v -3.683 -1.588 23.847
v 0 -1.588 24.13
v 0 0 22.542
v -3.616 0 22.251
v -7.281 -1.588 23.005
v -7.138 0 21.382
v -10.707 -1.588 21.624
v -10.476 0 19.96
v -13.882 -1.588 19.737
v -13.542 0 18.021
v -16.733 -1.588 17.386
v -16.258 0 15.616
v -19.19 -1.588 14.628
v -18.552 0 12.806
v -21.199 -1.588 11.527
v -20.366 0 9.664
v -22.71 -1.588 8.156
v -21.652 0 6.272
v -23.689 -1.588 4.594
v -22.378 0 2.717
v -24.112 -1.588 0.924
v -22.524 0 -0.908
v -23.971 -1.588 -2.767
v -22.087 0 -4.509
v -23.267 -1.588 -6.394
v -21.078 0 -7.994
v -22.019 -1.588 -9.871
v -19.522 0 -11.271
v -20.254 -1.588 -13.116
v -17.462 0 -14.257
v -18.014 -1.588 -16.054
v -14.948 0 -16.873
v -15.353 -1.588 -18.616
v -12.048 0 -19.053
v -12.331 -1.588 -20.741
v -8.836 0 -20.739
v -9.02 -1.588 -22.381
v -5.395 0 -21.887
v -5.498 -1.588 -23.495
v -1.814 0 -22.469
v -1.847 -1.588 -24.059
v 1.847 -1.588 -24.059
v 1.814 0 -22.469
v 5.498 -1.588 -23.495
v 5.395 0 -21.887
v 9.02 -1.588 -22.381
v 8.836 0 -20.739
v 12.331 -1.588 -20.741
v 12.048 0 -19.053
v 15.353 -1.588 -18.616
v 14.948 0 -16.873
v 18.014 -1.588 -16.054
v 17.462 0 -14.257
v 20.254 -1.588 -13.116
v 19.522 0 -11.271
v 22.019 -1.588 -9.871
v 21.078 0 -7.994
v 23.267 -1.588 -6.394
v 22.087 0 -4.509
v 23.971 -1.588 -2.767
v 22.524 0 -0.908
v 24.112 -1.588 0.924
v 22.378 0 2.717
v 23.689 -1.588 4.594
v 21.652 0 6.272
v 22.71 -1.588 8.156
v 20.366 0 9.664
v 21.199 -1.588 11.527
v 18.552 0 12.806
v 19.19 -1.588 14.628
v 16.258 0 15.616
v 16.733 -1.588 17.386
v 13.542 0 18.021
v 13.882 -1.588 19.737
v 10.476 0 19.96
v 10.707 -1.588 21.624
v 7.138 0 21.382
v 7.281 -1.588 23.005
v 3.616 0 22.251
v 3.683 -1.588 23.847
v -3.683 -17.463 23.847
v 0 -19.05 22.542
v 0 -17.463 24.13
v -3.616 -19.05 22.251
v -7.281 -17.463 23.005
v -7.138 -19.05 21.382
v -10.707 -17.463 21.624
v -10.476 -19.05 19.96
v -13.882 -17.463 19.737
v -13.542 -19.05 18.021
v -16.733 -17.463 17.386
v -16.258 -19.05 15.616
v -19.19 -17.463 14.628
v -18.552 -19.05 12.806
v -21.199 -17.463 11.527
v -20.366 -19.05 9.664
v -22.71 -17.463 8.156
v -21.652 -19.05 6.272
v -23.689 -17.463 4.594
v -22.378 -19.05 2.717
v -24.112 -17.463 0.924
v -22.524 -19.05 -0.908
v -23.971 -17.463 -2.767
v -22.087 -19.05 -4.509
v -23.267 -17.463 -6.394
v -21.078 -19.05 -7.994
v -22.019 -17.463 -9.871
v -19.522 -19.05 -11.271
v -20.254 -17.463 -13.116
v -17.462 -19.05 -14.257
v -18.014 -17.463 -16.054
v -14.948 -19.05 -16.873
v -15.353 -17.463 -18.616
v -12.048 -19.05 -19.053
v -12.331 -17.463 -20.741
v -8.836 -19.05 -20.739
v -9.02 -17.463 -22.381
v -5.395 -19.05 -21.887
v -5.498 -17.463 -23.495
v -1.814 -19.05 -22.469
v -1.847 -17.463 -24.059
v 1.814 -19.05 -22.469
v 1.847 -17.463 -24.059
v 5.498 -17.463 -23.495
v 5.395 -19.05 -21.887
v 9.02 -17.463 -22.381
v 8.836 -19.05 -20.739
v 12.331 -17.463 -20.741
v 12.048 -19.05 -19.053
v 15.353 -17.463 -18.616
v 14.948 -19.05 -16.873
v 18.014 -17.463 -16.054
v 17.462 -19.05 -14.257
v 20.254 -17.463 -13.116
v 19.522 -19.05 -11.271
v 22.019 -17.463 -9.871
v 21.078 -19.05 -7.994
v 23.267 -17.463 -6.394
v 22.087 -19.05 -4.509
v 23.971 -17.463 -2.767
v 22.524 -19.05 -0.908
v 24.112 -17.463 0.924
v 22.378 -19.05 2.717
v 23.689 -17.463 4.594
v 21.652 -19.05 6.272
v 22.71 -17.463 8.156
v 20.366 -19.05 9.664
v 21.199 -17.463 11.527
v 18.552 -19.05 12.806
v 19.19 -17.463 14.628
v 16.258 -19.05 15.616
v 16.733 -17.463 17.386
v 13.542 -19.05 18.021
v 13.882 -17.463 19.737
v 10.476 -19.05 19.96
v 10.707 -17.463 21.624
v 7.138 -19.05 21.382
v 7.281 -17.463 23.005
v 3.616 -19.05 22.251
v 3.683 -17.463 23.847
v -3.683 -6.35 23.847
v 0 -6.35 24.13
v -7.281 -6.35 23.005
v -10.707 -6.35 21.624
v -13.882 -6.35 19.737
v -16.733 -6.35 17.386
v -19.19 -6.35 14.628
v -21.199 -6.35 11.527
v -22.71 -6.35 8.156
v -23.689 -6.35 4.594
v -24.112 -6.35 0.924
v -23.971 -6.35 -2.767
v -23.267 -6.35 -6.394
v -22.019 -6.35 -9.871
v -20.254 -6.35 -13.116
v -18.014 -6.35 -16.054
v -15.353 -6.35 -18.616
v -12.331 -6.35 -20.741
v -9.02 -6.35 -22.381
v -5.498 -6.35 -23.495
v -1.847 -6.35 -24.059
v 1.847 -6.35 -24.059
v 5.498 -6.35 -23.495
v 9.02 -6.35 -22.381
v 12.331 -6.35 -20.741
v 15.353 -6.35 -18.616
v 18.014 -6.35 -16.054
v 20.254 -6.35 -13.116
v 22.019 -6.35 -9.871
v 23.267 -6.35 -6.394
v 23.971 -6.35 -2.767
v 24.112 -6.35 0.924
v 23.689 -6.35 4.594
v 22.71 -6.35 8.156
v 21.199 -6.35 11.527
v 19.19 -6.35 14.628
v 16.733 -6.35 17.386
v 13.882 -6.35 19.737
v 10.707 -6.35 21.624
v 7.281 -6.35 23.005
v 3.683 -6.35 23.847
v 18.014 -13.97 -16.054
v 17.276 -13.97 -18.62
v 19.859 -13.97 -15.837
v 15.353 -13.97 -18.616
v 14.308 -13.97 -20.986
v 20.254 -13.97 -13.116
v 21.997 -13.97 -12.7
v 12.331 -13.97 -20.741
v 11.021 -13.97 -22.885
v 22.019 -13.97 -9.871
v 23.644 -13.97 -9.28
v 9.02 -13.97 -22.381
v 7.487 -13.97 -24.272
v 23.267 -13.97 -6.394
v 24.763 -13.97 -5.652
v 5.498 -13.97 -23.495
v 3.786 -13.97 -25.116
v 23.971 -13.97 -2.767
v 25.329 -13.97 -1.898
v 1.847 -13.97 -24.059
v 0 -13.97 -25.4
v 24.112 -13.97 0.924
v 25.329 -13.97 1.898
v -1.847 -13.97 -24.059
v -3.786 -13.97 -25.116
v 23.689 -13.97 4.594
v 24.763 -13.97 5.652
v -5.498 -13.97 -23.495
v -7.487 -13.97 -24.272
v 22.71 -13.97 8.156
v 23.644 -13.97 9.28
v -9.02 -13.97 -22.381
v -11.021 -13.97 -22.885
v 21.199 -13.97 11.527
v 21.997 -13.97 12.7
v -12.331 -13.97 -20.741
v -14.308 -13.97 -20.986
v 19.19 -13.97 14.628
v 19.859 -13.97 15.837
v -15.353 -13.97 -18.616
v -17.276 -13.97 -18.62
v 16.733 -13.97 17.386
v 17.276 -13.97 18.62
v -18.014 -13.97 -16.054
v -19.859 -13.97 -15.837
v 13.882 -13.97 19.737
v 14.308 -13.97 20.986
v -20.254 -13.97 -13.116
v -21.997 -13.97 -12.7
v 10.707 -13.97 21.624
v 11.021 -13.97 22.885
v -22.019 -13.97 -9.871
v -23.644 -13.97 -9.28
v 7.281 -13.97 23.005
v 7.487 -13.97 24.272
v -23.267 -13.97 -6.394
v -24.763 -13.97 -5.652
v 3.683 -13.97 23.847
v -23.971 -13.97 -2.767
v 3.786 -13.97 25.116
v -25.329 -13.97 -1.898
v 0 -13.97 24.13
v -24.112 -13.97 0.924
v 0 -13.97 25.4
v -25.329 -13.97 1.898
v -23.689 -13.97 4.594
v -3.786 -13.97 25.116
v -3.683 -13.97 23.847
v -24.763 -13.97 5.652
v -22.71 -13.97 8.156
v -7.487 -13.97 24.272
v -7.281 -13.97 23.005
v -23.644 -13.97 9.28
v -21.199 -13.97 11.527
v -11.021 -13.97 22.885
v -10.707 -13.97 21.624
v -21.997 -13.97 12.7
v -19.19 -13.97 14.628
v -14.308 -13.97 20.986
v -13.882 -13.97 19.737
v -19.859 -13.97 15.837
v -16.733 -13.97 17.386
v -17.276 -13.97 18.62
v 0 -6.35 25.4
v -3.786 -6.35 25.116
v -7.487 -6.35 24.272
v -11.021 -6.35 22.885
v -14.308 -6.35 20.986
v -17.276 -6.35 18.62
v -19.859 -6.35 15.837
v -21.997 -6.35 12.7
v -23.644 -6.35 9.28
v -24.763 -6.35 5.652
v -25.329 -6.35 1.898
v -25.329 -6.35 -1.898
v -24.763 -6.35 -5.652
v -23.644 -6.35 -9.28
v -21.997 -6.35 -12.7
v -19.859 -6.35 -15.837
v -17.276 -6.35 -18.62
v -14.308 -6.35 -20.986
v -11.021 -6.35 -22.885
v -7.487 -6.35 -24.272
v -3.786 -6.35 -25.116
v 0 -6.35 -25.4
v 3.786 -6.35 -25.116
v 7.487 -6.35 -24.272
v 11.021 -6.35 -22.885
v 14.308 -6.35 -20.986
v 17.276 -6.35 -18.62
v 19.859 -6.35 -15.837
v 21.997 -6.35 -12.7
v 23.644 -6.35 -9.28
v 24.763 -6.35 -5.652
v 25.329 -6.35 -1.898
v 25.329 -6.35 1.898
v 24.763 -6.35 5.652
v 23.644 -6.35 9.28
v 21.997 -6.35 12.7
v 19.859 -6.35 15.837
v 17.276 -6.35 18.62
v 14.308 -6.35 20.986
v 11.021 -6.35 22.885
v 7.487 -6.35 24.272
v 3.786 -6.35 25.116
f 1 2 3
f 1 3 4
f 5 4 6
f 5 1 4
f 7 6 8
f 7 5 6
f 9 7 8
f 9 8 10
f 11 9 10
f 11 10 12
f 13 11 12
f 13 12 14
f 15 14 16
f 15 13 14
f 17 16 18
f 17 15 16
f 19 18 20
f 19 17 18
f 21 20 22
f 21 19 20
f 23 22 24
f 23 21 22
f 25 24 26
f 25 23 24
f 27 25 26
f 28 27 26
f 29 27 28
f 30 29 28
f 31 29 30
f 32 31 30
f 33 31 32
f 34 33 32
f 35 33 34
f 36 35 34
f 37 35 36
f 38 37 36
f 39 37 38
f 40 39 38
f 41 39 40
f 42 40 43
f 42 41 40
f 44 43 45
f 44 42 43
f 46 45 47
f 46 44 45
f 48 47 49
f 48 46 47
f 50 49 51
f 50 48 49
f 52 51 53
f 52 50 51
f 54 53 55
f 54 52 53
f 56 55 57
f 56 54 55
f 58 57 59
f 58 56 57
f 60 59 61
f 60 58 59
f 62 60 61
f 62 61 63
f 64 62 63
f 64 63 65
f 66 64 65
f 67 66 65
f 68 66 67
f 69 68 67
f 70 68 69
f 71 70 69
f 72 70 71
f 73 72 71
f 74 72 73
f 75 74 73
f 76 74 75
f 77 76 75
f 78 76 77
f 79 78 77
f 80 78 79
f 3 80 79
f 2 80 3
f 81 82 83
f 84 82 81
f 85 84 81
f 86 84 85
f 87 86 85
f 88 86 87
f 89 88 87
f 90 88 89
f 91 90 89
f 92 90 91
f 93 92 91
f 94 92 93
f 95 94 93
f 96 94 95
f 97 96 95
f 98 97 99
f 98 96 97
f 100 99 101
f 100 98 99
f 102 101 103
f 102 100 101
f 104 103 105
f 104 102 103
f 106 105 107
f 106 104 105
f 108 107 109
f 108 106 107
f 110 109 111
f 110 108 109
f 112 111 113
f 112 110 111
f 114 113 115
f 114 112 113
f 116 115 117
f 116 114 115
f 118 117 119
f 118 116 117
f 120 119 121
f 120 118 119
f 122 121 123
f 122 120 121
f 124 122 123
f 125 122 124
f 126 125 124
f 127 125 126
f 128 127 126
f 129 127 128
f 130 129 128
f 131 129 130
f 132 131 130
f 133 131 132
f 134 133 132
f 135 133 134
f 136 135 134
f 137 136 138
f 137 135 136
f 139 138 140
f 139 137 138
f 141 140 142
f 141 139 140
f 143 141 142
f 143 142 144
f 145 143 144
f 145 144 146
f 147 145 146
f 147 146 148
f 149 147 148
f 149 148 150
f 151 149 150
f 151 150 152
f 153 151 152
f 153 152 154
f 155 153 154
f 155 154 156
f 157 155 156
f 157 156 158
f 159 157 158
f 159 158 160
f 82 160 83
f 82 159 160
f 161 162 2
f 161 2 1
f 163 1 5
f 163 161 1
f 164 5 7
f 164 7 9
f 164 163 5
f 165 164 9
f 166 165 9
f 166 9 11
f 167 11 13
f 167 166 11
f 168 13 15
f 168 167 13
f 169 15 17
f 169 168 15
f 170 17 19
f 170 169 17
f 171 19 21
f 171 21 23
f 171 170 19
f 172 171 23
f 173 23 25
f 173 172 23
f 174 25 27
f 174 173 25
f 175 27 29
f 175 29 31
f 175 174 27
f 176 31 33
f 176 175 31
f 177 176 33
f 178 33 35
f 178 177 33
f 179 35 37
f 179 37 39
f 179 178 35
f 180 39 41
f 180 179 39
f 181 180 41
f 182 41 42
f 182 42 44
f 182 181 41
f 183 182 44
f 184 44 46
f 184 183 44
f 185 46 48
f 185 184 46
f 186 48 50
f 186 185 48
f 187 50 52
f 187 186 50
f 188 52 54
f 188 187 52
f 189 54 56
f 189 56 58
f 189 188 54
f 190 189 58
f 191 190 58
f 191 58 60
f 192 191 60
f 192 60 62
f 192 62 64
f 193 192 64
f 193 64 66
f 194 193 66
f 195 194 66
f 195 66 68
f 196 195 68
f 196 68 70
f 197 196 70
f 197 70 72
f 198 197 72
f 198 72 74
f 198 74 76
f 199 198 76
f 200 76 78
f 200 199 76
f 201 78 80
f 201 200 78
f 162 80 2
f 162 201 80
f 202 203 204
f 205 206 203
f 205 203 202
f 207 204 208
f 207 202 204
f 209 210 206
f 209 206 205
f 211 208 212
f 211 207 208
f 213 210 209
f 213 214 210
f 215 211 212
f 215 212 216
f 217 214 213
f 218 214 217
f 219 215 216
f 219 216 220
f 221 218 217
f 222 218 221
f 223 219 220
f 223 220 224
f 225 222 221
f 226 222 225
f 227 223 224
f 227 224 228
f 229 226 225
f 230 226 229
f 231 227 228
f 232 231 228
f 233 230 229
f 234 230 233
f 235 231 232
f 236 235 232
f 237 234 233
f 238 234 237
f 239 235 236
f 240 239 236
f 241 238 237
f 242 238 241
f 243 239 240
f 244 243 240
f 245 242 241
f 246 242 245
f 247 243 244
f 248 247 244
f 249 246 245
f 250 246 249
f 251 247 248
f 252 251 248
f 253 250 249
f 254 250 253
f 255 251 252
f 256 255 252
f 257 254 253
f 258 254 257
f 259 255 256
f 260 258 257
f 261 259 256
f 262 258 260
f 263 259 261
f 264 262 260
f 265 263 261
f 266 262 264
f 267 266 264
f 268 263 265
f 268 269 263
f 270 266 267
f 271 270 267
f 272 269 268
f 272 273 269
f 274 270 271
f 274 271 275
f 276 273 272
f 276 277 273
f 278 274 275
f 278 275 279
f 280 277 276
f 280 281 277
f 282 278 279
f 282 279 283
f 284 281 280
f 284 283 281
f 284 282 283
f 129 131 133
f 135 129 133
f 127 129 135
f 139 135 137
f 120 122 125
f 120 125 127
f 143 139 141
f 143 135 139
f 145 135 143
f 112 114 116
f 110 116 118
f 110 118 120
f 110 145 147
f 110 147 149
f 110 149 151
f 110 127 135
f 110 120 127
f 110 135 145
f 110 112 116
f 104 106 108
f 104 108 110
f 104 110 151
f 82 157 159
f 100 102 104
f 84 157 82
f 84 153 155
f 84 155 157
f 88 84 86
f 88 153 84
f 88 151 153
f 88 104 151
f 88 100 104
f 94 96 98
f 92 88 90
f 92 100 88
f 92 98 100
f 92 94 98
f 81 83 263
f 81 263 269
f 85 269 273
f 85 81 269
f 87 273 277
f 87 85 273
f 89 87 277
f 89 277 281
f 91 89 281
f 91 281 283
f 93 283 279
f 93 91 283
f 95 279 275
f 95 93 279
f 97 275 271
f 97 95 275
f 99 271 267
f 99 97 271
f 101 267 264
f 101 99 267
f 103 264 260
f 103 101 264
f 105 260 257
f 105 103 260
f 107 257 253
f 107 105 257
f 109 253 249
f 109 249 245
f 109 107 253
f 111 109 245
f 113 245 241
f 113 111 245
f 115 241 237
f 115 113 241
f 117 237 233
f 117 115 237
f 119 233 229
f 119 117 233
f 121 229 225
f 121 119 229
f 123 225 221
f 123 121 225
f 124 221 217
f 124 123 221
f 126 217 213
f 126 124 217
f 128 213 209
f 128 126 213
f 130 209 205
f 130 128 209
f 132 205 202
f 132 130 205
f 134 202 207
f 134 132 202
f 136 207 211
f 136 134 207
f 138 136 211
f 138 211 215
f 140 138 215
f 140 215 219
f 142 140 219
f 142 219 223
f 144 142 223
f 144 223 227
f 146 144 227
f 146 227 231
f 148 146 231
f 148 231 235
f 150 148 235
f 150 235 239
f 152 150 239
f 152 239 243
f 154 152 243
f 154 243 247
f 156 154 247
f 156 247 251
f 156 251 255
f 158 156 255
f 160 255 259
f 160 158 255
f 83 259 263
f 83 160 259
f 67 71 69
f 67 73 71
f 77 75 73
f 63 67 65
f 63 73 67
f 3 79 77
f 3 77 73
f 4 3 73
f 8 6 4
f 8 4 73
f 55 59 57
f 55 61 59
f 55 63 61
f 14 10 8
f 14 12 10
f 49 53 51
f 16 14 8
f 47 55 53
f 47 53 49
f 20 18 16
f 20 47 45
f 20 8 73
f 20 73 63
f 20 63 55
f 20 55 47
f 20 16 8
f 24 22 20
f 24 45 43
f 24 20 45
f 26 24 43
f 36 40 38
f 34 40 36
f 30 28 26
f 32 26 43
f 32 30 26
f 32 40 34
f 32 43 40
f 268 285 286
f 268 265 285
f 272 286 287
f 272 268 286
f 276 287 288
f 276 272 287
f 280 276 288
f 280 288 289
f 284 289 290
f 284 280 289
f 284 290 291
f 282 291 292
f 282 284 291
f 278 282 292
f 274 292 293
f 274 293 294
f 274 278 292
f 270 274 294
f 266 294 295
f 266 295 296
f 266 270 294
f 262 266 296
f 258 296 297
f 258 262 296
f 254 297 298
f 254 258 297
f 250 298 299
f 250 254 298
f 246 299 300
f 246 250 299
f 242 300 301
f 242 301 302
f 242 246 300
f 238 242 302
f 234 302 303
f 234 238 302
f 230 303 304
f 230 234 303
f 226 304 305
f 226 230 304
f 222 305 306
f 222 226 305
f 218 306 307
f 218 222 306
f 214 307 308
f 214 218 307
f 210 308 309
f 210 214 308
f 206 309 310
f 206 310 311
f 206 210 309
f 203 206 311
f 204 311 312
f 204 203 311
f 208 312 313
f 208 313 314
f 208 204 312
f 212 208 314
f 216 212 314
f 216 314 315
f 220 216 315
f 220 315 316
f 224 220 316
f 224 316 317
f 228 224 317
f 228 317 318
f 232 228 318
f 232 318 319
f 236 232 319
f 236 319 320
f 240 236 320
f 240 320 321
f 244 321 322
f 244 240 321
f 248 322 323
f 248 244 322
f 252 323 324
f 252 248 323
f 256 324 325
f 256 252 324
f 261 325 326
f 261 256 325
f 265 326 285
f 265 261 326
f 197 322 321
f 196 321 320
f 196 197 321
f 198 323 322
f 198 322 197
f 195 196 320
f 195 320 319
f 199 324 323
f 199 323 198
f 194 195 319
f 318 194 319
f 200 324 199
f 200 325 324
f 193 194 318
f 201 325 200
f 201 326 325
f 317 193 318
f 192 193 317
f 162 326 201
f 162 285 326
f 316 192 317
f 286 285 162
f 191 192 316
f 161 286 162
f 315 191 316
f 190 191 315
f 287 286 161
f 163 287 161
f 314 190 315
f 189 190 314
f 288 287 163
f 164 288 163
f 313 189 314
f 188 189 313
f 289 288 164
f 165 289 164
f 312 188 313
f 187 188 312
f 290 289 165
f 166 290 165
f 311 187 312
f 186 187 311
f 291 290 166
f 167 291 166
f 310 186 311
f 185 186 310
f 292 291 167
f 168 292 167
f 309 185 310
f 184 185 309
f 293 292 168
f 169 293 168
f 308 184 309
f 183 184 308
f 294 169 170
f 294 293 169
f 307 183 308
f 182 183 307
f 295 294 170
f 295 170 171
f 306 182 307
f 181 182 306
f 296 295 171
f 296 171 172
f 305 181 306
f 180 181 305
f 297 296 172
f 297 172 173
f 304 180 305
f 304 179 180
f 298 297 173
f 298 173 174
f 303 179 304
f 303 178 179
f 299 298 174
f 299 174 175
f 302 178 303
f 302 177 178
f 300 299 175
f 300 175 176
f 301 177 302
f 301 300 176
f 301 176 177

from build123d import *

# Parameters (mm, degrees)
LOX_INSTALL_SIZE    = 1.5875
O_RING_INSTALL_SIZE = 1.5875


with BuildPart() as part:
    # Sketch1 → Revolve1 (revolve)
    with BuildSketch(Plane.XY, mode=Mode.PRIVATE) as revolve1_sk:
        Polygon((0, 0), (24.13, 0), (24.13, -6.35), (25.4, -6.35), (25.4, -13.97), (24.13, -13.97), (24.13, -19.05), (0, -19.05), align=None)
    revolve(revolve1_sk.sketch.rotate(Axis((0, 0, 0), (0, -1, 0)), 90), axis=Axis((0, 0, 0), (0, -1, 0)))

    # lox install
    lox_install_edges = [part.edges().sort_by_distance(p)[0] for p in [
        (0, 0, -24.13),
    ]]
    chamfer(lox_install_edges, length=LOX_INSTALL_SIZE)

    # o-ring install
    o_ring_install_edges = [part.edges().sort_by_distance(p)[0] for p in [
        (0, -19.05, -24.13),
    ]]
    chamfer(o_ring_install_edges, length=O_RING_INSTALL_SIZE)


solid = part.part
